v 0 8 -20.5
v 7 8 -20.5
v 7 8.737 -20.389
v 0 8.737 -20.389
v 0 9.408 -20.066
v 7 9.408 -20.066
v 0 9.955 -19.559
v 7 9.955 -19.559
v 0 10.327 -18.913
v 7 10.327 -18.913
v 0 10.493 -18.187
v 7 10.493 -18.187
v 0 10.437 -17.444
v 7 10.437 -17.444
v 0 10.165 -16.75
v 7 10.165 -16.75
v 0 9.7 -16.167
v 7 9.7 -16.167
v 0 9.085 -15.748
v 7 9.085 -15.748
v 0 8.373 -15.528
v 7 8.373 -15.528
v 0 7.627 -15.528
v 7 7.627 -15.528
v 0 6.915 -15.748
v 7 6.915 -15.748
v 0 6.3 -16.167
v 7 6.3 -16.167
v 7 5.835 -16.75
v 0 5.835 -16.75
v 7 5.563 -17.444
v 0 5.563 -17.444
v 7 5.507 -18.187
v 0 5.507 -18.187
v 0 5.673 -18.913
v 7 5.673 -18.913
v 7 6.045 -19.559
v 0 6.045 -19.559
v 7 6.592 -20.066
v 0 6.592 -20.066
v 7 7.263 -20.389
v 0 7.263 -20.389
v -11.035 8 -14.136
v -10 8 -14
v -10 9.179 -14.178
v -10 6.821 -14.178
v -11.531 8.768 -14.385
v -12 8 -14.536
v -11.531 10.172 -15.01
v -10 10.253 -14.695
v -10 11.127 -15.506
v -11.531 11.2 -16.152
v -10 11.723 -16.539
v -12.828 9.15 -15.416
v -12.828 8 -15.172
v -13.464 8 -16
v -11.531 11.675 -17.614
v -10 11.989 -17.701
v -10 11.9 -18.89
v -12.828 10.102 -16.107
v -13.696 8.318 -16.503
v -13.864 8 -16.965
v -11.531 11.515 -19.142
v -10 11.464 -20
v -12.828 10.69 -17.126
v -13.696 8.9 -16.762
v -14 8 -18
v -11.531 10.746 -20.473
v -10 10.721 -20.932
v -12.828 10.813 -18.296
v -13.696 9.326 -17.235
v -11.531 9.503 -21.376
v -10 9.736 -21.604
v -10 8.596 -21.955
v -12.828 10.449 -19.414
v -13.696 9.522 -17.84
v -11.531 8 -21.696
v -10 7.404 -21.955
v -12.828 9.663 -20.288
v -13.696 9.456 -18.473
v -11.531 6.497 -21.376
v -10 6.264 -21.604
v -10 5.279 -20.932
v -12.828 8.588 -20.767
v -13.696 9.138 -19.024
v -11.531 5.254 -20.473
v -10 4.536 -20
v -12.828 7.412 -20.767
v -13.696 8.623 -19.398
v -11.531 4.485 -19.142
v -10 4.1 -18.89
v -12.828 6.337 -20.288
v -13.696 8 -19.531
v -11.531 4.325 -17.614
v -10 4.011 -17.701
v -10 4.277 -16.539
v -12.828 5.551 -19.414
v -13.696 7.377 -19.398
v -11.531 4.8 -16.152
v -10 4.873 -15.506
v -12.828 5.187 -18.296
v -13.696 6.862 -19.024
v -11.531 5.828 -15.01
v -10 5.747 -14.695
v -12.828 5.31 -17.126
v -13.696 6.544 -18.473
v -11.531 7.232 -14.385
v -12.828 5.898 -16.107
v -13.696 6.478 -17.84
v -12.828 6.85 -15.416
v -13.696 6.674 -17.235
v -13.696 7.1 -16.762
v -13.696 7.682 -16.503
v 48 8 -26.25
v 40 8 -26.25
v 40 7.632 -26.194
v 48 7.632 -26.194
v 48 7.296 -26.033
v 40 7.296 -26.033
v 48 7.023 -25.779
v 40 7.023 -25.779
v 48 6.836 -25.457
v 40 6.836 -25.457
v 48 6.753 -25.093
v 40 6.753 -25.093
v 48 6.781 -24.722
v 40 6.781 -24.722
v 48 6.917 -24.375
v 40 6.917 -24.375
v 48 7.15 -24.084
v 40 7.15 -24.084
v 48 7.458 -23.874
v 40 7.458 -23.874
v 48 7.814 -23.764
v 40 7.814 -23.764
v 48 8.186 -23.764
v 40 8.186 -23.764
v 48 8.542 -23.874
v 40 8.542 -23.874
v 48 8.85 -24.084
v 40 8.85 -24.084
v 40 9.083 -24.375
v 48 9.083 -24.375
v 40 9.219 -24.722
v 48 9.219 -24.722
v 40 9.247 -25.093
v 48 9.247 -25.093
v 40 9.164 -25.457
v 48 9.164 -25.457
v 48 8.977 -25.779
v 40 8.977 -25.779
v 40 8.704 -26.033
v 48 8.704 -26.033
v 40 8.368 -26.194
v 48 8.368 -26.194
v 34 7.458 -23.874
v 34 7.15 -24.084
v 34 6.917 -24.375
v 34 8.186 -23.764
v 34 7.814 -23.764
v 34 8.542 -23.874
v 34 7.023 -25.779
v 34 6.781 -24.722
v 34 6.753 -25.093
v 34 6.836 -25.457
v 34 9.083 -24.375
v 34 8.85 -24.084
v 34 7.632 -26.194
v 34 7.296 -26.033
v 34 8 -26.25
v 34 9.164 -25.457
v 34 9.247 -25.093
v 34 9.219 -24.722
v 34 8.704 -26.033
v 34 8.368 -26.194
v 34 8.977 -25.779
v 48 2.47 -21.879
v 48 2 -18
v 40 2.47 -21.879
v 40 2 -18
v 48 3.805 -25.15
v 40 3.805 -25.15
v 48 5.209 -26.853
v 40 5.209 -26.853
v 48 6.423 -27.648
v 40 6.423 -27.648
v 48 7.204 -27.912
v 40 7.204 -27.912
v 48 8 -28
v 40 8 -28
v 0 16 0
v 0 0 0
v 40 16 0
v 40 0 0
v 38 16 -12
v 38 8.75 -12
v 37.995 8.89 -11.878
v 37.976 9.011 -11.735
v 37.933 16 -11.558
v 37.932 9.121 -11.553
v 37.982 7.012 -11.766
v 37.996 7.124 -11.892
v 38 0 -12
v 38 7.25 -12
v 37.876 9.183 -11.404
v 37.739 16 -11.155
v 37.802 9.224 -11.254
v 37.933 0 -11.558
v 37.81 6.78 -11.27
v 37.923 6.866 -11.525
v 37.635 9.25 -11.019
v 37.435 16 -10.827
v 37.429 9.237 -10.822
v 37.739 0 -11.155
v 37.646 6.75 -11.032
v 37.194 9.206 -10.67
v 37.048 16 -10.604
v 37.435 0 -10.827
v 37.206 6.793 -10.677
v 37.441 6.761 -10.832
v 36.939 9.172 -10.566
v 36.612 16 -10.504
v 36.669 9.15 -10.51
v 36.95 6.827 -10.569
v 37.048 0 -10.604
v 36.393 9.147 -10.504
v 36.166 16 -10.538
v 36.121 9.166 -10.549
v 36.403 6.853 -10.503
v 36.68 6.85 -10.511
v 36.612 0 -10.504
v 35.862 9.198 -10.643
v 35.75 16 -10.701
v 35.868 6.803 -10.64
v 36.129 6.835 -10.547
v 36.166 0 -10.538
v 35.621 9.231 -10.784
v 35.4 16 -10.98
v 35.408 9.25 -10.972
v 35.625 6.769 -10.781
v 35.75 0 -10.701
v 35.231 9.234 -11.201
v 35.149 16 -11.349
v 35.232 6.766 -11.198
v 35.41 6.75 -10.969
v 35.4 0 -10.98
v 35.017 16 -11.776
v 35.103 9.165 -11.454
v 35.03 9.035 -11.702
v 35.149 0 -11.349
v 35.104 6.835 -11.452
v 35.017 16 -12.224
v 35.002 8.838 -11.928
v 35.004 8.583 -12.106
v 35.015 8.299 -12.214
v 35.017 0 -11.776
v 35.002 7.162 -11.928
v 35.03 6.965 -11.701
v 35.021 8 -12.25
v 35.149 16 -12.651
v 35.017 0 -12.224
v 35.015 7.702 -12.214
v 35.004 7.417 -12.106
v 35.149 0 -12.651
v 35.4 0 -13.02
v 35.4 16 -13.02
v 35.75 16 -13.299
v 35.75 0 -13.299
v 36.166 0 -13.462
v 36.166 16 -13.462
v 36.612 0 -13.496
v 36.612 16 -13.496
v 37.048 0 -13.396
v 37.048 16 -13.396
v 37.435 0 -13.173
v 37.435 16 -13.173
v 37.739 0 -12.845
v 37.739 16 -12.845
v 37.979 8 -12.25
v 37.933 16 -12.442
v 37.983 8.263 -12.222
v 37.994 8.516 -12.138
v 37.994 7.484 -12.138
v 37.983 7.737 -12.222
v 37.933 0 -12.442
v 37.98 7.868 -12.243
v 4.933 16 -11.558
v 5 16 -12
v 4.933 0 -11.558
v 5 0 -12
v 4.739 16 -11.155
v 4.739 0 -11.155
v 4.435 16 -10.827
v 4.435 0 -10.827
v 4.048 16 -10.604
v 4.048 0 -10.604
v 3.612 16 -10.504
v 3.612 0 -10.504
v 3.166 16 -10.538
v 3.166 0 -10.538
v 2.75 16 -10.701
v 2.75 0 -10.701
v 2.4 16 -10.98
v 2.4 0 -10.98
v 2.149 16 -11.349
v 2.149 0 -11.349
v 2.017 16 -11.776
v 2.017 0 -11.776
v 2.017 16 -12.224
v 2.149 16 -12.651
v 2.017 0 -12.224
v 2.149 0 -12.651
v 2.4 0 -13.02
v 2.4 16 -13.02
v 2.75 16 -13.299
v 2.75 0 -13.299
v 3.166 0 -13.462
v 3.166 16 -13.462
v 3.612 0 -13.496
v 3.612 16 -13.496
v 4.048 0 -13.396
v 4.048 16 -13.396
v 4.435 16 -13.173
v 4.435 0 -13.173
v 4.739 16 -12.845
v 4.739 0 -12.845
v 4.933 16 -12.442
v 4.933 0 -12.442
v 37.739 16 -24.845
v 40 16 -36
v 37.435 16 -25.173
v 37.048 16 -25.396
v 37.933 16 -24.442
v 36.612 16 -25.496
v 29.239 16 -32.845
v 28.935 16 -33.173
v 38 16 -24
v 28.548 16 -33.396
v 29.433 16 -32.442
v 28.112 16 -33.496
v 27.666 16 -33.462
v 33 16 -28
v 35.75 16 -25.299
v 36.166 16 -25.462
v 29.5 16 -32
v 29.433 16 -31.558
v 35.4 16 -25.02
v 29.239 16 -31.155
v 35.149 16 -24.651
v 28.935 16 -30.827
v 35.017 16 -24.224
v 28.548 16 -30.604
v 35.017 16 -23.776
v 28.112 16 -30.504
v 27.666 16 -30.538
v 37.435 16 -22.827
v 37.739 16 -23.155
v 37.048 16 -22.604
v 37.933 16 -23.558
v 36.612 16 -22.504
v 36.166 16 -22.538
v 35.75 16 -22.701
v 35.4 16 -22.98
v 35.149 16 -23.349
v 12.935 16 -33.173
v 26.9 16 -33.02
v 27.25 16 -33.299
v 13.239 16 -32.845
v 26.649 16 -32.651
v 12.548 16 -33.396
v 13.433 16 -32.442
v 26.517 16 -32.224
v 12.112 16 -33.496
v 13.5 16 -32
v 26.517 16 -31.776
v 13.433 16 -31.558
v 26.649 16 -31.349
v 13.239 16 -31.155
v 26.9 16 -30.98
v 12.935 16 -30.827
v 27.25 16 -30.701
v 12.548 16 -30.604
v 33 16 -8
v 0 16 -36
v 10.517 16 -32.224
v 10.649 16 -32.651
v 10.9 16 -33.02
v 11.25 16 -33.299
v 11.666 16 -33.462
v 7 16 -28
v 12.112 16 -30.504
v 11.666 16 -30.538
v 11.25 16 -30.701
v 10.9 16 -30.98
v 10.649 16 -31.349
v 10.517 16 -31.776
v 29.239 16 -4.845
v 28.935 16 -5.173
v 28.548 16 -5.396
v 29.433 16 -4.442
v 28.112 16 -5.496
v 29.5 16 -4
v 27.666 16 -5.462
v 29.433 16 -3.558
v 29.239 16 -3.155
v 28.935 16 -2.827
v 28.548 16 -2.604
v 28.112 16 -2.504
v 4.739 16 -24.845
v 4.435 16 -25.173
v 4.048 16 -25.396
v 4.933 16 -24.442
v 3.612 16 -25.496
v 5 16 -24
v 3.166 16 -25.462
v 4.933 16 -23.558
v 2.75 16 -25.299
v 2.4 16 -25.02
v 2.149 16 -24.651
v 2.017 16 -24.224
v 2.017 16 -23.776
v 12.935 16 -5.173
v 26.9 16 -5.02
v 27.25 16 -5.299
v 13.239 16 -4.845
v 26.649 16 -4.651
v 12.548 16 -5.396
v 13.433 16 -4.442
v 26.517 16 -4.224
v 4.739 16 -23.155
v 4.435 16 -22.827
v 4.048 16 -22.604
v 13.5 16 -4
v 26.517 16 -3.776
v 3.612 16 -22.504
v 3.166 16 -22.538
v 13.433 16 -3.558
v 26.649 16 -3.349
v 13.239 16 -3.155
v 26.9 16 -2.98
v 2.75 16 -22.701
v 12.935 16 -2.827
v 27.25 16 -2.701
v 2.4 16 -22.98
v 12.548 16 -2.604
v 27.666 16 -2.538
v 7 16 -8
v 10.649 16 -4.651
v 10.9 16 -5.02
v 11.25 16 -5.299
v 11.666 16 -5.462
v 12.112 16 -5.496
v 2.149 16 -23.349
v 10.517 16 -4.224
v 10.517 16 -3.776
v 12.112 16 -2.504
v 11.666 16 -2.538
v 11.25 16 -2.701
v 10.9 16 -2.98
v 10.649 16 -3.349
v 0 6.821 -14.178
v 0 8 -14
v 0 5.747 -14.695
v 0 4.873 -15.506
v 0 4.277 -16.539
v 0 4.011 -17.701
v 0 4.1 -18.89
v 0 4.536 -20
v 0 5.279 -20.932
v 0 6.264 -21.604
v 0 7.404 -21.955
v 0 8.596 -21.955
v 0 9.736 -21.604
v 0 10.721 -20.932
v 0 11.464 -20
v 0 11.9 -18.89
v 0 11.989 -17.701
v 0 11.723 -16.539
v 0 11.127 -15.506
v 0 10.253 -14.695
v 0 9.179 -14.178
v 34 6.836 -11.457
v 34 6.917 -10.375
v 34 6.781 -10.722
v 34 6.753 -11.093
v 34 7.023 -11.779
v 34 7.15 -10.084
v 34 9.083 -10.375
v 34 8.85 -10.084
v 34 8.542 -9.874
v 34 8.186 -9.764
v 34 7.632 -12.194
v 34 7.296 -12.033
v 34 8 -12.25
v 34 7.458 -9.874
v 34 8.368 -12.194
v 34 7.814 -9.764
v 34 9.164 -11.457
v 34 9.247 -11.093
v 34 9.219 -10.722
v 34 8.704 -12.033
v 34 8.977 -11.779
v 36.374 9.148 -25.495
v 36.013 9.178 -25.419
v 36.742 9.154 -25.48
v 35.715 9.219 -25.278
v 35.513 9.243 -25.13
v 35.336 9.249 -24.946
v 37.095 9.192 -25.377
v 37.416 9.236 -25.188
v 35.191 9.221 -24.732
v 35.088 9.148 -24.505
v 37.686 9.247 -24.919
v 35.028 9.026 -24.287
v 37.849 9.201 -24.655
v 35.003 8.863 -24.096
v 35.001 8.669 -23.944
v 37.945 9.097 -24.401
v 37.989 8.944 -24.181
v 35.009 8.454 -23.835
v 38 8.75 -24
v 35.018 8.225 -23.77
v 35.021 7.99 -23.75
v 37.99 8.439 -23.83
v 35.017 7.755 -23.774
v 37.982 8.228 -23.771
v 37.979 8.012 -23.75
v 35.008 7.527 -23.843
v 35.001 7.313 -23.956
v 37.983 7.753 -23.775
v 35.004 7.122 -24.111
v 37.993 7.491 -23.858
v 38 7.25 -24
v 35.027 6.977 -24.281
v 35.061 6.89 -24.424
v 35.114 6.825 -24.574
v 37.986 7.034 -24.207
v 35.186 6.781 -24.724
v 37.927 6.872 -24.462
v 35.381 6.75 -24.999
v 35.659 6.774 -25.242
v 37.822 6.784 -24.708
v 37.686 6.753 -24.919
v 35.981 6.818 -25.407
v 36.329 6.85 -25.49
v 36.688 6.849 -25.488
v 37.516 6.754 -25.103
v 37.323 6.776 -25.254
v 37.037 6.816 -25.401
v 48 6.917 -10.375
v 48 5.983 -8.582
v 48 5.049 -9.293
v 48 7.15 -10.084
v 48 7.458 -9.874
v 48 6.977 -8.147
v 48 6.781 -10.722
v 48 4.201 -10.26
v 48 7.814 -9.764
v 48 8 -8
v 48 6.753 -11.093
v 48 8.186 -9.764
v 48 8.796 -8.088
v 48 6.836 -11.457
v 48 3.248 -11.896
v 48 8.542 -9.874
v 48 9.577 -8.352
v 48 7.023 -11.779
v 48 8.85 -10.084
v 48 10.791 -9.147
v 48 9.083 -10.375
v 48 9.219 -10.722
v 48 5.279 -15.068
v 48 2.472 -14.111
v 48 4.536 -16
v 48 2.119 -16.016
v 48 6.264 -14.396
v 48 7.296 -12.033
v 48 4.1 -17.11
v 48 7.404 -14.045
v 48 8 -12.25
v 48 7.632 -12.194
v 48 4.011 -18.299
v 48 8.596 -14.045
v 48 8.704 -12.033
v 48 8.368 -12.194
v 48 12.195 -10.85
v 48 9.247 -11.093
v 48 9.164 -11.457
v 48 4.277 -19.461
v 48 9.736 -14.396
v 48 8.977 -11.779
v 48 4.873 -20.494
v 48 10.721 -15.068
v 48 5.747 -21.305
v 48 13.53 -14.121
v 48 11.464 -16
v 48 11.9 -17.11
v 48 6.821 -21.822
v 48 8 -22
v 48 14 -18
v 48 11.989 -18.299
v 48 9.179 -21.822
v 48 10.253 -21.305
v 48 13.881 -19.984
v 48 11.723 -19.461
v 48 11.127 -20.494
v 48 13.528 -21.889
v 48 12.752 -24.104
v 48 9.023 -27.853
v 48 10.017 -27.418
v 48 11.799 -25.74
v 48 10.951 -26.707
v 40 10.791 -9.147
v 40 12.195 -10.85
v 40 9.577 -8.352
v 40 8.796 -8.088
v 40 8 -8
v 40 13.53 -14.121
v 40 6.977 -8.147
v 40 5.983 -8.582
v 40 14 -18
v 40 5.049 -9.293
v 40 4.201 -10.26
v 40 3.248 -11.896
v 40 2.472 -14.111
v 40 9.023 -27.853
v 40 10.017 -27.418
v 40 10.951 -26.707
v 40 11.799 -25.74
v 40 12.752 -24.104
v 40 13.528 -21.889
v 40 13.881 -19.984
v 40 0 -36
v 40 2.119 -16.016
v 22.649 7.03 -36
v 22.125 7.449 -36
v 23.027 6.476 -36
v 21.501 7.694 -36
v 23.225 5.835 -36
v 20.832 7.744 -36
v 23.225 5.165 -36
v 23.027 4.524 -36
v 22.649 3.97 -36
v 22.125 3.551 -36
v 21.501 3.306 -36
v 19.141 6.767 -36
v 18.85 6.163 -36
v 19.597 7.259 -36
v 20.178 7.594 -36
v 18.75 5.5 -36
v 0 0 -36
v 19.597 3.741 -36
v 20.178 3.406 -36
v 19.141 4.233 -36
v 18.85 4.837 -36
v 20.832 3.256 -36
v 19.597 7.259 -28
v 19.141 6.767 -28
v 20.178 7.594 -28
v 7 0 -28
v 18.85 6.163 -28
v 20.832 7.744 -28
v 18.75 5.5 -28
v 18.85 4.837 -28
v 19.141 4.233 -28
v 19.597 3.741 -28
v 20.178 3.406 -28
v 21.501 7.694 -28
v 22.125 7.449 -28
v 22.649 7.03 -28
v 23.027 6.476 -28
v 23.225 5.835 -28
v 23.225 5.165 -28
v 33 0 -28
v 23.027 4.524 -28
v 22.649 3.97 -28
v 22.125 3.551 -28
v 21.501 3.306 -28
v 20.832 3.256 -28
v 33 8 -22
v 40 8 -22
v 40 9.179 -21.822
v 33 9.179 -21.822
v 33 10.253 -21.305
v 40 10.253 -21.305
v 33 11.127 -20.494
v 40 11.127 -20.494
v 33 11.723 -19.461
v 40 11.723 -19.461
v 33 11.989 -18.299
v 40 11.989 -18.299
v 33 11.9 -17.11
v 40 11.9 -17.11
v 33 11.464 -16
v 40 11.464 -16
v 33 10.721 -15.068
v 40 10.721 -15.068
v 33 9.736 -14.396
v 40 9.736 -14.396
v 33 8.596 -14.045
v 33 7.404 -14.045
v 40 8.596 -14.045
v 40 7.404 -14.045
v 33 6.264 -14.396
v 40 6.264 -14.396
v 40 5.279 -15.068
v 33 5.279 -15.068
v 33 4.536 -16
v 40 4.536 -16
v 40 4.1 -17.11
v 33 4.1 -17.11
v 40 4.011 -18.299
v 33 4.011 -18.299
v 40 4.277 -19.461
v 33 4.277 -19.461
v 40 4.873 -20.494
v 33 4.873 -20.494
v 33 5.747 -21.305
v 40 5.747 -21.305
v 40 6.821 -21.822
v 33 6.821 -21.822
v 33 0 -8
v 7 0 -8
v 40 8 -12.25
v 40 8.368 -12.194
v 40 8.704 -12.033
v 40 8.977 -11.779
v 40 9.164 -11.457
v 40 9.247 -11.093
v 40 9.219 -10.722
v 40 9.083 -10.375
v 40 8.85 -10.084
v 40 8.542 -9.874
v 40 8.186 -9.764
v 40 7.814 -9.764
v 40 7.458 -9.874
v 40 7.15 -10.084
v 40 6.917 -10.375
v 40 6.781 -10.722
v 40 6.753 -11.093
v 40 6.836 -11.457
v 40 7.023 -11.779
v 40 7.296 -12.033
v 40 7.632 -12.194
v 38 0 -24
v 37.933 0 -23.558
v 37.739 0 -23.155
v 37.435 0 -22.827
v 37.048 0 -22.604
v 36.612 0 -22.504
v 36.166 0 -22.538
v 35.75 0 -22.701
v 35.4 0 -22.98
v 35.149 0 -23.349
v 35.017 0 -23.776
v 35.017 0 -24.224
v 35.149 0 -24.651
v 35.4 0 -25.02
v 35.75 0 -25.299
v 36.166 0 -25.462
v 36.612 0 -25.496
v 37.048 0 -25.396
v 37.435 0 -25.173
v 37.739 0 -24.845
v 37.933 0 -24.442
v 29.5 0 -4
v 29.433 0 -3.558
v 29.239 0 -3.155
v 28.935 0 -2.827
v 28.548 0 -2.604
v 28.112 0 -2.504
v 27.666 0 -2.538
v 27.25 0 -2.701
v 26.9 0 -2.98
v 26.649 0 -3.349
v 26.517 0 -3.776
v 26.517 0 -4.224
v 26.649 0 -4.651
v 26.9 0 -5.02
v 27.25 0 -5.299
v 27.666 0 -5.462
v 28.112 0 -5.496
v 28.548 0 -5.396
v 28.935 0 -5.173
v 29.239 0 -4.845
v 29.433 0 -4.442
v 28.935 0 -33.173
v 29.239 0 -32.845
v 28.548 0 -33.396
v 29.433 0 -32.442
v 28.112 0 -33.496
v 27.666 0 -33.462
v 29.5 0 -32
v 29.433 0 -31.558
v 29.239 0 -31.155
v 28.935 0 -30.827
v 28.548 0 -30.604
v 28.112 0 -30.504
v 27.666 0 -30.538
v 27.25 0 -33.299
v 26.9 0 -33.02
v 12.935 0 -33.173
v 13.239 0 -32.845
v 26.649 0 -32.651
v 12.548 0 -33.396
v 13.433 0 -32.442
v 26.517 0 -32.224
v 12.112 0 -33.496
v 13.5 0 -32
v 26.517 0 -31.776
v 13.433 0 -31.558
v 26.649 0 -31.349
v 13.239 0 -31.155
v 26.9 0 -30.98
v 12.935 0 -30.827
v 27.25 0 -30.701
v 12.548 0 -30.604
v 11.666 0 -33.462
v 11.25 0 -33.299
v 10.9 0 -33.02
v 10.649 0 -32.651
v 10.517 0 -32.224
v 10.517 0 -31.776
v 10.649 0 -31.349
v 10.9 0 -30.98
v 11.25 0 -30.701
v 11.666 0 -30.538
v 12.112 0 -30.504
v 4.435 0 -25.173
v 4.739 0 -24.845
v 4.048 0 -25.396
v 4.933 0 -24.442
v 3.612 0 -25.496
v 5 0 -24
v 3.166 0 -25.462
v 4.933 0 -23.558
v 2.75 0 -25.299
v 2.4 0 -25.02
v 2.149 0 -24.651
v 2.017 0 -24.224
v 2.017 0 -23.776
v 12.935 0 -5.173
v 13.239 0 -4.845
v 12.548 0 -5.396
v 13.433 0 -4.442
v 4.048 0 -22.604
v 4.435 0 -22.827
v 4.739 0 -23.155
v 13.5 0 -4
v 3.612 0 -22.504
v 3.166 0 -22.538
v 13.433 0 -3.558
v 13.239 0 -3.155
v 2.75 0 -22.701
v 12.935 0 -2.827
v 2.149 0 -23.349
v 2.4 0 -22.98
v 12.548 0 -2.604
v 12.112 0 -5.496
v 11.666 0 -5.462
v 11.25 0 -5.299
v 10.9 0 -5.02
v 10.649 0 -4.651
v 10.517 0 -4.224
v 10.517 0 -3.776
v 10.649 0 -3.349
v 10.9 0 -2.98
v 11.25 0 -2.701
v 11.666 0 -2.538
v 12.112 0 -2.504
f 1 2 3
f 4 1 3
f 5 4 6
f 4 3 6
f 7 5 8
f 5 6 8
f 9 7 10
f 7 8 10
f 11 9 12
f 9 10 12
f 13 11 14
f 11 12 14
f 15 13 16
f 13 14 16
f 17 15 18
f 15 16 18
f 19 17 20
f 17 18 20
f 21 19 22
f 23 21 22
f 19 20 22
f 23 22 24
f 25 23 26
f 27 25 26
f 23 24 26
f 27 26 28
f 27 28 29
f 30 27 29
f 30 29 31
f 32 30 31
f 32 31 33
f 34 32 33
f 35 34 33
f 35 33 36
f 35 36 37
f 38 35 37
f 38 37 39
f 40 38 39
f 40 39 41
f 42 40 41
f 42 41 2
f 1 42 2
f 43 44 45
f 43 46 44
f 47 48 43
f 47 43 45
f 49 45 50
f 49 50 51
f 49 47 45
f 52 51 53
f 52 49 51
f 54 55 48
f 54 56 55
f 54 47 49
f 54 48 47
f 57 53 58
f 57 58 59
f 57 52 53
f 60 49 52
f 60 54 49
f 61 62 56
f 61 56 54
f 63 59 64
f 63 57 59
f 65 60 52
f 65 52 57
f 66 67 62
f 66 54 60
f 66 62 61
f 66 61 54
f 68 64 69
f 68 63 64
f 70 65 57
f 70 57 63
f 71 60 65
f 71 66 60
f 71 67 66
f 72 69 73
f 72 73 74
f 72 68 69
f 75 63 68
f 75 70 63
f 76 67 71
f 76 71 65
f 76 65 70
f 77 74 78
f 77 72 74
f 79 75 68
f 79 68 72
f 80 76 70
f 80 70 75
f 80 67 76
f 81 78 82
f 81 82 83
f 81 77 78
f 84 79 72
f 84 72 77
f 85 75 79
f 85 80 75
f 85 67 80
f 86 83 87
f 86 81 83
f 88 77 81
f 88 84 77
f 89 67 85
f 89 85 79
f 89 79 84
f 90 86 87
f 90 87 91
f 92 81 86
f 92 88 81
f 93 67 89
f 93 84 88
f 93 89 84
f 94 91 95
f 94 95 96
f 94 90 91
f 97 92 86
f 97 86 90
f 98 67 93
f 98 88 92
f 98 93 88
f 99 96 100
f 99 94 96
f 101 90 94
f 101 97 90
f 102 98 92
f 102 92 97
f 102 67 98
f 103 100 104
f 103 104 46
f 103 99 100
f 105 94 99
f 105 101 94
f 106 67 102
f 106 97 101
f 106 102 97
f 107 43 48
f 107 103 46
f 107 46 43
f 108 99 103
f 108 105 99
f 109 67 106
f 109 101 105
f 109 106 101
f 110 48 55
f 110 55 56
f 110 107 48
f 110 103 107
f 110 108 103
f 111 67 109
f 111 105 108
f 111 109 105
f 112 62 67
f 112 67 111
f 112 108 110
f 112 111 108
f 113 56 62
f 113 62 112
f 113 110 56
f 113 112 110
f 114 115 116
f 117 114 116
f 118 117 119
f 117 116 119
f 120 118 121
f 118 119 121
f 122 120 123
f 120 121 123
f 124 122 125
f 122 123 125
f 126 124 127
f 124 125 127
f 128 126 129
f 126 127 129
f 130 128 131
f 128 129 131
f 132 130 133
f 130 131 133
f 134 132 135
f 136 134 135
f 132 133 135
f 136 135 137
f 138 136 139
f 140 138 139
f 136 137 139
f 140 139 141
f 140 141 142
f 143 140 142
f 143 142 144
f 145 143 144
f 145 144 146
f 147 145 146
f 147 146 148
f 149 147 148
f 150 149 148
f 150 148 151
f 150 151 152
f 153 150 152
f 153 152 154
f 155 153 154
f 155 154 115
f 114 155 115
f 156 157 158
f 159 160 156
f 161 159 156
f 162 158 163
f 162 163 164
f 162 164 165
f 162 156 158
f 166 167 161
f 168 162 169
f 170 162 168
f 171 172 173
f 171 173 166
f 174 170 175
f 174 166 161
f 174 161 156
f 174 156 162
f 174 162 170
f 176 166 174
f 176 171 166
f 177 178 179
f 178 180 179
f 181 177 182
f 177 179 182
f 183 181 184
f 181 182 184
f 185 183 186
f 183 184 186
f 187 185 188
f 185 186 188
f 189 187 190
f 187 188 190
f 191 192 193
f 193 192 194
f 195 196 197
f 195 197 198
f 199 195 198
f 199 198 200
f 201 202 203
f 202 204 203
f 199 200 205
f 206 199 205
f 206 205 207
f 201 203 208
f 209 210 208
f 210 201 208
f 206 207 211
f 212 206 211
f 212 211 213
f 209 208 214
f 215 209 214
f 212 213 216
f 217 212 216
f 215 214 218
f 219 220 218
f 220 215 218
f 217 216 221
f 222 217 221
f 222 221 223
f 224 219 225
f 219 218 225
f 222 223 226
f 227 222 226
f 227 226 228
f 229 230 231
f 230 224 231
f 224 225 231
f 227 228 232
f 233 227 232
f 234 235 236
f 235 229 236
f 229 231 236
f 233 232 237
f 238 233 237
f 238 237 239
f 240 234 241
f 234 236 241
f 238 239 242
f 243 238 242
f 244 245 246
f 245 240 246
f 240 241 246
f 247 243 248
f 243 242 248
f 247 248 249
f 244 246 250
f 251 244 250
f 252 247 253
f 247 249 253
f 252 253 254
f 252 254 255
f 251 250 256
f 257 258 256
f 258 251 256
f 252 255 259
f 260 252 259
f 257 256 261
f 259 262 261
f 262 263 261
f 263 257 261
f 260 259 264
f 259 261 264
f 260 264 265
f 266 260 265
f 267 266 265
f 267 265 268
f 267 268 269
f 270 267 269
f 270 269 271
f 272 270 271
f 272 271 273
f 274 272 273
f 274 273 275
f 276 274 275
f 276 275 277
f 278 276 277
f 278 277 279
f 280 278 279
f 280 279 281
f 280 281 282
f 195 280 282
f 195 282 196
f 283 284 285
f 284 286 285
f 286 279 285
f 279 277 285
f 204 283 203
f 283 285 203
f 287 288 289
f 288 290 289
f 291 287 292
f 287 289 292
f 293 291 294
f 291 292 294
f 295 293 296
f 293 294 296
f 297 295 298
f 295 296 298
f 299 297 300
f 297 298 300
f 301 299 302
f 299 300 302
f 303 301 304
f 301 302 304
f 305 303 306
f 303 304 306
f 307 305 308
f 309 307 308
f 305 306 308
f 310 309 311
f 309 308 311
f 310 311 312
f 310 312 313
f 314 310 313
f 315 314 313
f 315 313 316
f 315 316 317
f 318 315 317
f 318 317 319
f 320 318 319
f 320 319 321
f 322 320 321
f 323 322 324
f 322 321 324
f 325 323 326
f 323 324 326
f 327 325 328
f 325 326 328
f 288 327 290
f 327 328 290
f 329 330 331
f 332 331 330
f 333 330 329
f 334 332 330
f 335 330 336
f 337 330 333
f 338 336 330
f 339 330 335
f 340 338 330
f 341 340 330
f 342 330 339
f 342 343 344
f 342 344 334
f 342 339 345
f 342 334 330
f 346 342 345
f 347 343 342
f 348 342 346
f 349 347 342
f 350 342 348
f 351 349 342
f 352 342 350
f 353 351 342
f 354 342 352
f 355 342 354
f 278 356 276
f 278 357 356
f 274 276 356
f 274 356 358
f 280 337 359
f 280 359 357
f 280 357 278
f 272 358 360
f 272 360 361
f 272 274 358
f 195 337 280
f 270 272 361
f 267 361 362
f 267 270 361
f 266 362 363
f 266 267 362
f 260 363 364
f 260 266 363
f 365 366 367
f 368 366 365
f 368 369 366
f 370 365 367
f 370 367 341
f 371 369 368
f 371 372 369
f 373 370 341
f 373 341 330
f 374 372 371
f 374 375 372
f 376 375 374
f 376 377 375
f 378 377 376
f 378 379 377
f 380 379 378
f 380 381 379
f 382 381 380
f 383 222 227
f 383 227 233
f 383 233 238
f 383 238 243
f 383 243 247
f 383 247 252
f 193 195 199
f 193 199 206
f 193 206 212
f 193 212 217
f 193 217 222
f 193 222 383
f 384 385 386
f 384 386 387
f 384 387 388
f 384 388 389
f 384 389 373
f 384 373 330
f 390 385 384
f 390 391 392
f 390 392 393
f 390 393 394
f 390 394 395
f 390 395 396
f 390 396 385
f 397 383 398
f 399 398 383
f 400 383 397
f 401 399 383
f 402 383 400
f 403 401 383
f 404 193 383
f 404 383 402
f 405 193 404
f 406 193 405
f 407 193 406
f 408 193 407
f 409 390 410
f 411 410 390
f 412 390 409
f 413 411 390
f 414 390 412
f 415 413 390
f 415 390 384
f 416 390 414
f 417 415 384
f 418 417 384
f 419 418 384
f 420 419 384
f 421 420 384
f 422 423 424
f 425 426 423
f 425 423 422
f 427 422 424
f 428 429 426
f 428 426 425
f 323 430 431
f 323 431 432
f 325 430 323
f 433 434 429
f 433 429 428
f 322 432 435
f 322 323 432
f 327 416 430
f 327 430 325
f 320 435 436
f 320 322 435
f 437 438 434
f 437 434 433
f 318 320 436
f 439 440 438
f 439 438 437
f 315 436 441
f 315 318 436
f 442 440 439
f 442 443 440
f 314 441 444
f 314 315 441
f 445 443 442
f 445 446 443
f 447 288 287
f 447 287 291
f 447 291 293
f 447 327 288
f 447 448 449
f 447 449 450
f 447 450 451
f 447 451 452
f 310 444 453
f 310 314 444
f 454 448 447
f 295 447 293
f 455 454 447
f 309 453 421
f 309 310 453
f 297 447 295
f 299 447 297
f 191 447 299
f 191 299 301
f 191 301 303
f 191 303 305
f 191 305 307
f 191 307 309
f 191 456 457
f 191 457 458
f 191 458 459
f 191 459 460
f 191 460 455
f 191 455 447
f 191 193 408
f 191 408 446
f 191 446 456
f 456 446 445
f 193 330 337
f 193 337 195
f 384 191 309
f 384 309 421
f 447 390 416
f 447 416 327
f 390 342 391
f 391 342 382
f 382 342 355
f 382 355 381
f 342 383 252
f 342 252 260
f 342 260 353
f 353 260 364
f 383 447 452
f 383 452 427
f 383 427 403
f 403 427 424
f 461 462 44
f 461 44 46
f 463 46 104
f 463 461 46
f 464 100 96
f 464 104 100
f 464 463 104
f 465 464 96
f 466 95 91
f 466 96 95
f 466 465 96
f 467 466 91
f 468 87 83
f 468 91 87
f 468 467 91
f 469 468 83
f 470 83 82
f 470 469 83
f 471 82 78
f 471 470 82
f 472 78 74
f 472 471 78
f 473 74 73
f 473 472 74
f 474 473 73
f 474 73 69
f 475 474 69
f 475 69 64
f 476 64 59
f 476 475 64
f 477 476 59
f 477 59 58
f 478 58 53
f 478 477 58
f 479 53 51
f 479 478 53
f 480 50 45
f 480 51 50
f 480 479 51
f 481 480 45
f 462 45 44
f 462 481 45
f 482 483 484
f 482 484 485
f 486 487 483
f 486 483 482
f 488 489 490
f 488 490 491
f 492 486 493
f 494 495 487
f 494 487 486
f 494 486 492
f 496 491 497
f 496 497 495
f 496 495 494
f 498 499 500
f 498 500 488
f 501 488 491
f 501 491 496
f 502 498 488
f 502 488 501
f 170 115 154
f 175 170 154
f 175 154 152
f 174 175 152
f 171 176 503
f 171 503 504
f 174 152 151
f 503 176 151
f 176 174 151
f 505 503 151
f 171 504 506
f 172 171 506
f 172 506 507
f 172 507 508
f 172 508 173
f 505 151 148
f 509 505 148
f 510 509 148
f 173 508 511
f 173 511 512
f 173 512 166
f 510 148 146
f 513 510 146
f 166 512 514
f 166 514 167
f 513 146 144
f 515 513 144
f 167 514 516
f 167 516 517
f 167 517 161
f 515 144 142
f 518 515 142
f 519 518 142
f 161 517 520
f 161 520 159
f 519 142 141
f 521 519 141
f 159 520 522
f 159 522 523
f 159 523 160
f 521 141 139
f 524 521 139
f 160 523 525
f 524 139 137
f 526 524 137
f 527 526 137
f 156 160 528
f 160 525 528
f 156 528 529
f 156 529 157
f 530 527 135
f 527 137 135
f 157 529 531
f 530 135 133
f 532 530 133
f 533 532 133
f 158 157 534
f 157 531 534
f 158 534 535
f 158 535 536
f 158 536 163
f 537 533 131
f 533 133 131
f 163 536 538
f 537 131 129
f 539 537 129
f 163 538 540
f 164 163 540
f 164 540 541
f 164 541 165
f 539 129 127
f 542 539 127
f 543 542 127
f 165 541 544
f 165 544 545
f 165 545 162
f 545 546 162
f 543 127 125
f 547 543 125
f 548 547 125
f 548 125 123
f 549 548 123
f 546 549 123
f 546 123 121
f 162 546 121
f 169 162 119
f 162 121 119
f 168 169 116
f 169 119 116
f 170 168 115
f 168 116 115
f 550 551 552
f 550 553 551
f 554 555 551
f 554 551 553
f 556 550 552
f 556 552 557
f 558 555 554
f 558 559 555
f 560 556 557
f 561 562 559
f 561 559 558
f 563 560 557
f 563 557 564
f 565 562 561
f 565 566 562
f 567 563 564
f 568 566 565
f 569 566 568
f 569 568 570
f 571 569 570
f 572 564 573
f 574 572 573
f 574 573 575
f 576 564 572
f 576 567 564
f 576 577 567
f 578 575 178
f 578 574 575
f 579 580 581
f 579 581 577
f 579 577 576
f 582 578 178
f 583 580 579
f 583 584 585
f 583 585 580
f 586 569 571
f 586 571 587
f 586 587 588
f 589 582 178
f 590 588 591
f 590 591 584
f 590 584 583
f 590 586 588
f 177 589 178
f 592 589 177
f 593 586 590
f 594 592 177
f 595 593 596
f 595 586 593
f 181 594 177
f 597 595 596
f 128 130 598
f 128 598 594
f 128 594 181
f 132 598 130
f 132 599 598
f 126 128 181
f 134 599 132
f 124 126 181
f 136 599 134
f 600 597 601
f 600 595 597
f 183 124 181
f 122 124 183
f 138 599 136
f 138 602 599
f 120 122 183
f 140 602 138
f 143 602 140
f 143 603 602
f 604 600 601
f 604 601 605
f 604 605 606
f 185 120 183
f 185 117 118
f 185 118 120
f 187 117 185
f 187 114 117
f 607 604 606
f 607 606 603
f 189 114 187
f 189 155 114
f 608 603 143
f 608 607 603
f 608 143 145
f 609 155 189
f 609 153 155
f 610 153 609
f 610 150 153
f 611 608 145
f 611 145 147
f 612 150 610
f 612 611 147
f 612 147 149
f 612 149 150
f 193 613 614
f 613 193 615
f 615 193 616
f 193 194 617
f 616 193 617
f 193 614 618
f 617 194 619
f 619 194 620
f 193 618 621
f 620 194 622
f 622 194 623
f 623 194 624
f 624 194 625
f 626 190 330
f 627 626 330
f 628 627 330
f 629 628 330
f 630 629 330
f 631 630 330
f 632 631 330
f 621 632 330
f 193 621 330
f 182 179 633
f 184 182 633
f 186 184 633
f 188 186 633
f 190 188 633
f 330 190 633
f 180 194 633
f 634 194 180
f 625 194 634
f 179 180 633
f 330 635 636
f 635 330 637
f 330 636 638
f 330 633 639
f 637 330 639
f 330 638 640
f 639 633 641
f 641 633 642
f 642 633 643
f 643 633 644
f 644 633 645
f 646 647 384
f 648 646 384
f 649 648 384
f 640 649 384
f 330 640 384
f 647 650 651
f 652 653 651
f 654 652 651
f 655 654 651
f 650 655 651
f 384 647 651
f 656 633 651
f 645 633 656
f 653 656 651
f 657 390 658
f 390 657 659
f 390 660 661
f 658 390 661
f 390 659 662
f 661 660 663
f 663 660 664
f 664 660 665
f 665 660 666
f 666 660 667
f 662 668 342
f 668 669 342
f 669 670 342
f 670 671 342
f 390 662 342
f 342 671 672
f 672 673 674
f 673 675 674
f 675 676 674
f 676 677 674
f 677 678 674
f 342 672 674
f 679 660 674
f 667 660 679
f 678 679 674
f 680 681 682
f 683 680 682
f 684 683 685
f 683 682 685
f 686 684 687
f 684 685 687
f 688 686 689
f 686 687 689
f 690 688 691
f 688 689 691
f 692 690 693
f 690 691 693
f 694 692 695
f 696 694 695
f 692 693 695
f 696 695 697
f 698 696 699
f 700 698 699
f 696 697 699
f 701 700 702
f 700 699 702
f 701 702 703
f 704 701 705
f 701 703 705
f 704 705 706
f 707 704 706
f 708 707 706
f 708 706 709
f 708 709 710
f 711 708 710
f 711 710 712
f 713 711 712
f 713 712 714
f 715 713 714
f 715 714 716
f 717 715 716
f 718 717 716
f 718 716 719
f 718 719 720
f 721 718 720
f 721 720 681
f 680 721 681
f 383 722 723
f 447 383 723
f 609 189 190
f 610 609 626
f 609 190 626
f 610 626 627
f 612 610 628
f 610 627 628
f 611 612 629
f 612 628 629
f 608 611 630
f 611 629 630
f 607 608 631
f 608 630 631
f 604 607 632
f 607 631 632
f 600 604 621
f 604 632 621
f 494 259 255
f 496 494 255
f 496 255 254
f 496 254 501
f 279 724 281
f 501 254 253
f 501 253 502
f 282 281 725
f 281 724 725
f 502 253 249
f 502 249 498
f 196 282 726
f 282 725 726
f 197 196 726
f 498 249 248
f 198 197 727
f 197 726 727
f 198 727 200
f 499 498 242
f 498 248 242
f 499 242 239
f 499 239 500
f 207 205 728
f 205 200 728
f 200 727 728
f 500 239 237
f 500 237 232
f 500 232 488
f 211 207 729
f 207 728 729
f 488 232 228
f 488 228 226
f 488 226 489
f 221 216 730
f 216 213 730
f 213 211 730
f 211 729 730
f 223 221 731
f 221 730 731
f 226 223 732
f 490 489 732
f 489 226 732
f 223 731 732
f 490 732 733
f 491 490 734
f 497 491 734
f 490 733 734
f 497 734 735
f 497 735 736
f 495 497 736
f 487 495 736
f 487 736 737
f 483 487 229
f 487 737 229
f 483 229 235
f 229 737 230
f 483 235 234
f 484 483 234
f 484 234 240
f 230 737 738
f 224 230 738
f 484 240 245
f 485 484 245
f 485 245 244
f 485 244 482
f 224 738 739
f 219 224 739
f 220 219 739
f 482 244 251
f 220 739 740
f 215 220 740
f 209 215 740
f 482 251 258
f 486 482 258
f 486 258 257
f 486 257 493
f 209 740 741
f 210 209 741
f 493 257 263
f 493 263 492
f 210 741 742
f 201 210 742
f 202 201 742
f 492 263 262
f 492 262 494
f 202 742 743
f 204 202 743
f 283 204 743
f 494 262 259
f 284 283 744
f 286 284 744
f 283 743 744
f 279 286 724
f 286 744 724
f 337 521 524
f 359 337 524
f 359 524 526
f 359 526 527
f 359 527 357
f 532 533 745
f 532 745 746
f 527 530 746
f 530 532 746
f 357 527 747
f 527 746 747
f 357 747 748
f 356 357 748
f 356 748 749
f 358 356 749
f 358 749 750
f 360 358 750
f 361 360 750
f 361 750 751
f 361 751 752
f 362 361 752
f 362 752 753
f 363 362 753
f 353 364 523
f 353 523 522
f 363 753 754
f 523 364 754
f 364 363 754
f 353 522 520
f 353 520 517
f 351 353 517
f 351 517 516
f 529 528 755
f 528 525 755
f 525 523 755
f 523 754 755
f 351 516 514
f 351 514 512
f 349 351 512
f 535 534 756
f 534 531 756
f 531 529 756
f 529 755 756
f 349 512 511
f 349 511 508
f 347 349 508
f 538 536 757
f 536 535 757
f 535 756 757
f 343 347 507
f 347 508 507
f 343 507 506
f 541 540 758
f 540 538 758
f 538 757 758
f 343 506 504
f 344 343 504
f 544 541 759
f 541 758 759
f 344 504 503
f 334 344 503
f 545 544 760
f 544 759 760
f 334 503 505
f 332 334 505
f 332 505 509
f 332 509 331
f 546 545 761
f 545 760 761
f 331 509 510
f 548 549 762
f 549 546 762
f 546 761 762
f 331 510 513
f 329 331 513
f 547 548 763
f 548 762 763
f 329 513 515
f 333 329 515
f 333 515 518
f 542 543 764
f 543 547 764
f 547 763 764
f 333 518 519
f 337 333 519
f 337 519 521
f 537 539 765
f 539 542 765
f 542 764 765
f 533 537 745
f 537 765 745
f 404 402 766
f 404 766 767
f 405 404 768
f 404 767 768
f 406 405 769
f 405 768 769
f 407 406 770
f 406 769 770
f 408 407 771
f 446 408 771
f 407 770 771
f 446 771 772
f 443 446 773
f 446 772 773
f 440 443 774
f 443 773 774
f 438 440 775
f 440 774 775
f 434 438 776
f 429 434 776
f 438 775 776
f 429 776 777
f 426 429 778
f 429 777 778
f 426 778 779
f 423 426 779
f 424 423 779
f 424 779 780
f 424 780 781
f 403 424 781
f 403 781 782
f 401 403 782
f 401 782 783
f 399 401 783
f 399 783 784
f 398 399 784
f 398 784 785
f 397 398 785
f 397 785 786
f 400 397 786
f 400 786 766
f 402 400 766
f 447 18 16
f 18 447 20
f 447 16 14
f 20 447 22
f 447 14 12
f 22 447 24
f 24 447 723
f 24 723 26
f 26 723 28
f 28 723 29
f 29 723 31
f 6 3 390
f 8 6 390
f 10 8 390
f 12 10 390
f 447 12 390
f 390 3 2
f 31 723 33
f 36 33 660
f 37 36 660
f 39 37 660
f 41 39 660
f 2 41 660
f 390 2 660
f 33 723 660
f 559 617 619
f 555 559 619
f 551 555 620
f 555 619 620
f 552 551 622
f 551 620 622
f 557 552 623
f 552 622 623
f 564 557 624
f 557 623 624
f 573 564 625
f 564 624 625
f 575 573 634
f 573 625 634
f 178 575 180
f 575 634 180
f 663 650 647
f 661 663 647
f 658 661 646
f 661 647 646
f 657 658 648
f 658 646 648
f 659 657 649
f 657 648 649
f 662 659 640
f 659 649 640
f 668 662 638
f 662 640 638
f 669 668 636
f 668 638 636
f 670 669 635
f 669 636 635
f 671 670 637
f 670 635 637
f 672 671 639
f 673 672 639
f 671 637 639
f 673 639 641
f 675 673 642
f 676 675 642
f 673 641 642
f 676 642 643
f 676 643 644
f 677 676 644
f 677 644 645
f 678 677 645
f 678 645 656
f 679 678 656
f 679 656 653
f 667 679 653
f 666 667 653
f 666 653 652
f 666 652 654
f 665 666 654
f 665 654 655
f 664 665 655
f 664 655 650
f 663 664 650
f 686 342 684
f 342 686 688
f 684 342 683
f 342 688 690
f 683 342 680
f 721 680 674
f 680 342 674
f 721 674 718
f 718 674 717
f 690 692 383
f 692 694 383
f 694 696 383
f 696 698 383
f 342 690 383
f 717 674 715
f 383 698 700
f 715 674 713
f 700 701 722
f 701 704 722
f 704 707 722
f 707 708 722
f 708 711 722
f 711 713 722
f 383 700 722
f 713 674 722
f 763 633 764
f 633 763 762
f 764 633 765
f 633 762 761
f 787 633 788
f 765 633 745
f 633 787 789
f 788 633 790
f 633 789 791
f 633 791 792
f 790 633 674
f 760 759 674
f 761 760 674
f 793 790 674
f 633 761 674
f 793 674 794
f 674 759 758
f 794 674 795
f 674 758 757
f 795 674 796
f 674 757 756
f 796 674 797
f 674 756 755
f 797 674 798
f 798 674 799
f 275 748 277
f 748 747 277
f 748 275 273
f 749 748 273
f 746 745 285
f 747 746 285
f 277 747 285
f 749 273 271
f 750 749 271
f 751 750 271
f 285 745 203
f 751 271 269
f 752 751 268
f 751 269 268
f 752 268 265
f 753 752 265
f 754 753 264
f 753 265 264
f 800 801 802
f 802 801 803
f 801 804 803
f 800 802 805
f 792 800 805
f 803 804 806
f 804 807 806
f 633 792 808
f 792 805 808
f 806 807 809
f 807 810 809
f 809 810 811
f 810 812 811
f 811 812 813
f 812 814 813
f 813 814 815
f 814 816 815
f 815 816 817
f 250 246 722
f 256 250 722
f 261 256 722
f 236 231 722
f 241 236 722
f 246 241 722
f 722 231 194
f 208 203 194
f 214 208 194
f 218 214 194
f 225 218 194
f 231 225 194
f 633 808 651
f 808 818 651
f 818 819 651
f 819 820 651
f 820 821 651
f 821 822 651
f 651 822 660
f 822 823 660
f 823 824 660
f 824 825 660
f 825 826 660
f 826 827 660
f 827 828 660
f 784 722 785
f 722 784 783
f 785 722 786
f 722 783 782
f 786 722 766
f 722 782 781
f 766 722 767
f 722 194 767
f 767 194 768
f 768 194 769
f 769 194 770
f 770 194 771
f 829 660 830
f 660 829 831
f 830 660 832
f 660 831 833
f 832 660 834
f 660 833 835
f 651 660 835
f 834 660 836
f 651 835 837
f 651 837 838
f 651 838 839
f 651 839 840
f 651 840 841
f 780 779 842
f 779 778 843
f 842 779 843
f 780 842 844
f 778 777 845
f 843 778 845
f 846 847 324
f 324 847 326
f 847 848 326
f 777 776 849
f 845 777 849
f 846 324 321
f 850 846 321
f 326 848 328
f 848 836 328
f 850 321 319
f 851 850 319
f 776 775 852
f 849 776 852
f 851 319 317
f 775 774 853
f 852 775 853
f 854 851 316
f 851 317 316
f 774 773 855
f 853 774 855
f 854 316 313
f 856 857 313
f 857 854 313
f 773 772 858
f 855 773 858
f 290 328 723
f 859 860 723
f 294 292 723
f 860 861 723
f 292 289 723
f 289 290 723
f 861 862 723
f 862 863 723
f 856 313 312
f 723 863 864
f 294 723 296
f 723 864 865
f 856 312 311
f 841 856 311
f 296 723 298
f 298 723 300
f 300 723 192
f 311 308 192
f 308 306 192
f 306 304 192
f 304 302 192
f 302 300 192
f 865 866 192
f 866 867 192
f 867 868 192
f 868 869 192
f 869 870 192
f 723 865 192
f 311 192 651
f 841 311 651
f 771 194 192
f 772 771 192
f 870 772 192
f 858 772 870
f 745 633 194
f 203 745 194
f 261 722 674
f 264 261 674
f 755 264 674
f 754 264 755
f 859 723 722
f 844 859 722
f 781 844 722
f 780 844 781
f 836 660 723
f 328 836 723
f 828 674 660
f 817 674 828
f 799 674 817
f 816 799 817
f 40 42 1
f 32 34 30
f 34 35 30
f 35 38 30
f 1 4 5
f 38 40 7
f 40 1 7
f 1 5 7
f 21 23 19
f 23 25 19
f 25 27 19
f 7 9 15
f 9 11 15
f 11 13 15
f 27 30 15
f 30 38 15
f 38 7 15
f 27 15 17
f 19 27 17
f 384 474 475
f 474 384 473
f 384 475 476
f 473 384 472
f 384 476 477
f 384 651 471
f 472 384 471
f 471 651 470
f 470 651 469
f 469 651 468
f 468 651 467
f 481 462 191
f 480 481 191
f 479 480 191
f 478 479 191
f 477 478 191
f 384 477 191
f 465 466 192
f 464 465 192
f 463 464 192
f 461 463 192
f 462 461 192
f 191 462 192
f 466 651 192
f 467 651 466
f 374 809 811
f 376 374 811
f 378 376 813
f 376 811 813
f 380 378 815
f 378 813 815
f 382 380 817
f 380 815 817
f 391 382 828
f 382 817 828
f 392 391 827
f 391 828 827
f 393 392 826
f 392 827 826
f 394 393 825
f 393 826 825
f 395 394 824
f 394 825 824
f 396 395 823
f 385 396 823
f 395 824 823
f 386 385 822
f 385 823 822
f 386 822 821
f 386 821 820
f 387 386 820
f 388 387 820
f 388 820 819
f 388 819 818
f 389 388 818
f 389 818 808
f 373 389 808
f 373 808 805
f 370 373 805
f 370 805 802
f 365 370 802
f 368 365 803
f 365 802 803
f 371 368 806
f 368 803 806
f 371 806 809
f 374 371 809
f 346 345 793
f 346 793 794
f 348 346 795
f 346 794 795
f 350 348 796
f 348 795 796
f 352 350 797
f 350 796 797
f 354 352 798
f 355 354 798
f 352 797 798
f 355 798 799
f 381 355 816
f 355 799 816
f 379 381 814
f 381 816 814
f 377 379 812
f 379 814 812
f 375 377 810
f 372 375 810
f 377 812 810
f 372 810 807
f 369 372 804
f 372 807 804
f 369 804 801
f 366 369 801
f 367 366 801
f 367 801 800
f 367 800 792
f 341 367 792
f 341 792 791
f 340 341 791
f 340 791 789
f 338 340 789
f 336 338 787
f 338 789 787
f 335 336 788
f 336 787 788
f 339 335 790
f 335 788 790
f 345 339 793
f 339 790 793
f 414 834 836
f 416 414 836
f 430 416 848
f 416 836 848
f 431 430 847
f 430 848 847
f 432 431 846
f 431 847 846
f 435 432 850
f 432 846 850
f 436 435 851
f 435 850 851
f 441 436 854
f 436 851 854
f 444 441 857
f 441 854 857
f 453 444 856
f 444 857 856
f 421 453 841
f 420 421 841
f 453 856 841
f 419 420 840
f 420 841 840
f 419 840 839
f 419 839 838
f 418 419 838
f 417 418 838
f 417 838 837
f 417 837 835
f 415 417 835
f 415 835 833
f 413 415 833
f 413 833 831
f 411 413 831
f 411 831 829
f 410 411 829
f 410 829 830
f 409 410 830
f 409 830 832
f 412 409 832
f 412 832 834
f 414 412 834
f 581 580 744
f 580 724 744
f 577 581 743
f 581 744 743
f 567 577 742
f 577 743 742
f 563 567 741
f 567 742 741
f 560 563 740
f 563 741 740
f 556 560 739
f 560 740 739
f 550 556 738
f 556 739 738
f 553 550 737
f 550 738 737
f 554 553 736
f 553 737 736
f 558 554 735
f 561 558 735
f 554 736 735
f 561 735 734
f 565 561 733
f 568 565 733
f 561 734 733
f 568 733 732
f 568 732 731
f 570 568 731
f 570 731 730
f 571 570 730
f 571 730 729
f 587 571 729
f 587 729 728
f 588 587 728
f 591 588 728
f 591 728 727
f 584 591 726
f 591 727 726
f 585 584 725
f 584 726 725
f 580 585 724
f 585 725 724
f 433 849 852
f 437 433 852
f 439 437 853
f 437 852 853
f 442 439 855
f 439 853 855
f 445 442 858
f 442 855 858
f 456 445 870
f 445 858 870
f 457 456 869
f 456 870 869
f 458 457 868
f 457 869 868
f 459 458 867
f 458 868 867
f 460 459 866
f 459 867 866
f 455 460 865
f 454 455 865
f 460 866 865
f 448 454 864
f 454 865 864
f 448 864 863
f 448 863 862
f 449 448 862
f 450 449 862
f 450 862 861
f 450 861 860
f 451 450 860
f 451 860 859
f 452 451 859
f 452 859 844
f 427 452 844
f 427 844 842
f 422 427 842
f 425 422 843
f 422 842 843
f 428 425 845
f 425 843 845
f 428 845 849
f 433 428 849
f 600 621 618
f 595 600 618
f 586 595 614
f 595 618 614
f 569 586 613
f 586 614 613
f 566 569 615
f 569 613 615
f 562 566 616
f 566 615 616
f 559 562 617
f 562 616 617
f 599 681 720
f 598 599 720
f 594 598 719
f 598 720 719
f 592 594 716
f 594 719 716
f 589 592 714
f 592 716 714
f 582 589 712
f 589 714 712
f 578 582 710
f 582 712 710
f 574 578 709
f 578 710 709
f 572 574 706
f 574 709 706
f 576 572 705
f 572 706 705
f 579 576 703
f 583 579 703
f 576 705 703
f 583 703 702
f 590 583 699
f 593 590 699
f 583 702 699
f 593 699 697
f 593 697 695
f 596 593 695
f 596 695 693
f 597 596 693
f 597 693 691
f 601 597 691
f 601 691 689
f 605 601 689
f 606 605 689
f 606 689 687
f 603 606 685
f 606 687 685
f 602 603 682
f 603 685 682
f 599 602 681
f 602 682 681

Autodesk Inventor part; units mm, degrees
ref_plane "YZ Plane" through (0, 0, 0) normal (1, 0, 0) x (0, 1, 0)
ref_plane "XZ Plane" through (0, 0, 0) normal (0, 1, 0) x (-1, 0, 0)
ref_plane "XY Plane" through (0, 0, 0) normal (0, 0, 1) x (1, 0, 0)
sketch "Sketch1" plane through (0, 0, 0) normal (0, 1, 0) x (-1, 0, 0)
  line L0 (0, 0) -> (-40, 0)
  line L1 (-40, 0) -> (-40, -36)
  line L2 (-40, -36) -> (0, -36)
  line L3 (0, -36) -> (0, 0)
  line L4 (-7, -28) -> (-33, -28)
  line L5 (-33, -28) -> (-33, -8)
  line L6 (-33, -8) -> (-7, -8)
  line L7 (-7, -8) -> (-7, -28)
  dimension "d0" = 40
  dimension "d1" = 36
  dimension "d2" = 26
extrude "Extrusion1" add sketch "Sketch1" along normal blind 16
sketch "Sketch2" plane through (40, 0, 0) normal (1, 0, 0) x (0, 0, -1)
  line L0 (0, 0) -> (0, 16)
  line L1 (0, 8) -> (8, 8)
  line L2 (28, 0) -> (28, 16)
  line L3 (18, 14) -> (18, 2)
  ellipse E0 centre (18, 8) end of major axis (28, 8) minor radius 6
  line L4 (6.75, 0) -> (6.75, 16)
  line L5 (6.75, 8) -> (9.75, 8)
  circle A0 centre (11, 8) radius 1.25
  circle A1 centre (25, 8) radius 1.25
  circle A2 centre (18, 8) radius 2.5
  line L6 (12.25, 8) -> (15.5, 8)
  line L7 (20.5, 8) -> (23.75, 8)
  line L8 (20.5, 8) -> (23.75, 8)
  line L9 (26.25, 8) -> (28, 8)
  line L10 (8, 8) -> (9.75, 8)
  line L11 (12.25, 8) -> (15.5, 8)
  circle A3 centre (18, 8) radius 4
  line L12 (18, 8) -> (18, 10.5)
  line L13 (18, 12) -> (18, 14)
  dimension "d18" = 8
  dimension "d47" = 10
  dimension "d48" = 6
  dimension "d5" = 8
  dimension "d6" = 20
  dimension "d7" = 6
  dimension "d8" = 12
  dimension "d9" = 3
  dimension "d10" = 14
  dimension "d11" = 2.5
  dimension "d12" = 2.5
  dimension "d13" = 5
  dimension "d49" = 21.25
  dimension "d50" = 28
  dimension "d51" = 0
  dimension "d52" = 0
  dimension "d53" = 0
  dimension "d54" = 28
  dimension "d55" = 8
  dimension "d56" = 8
  dimension "d57" = 1.75
  dimension "d58" = 15.75
  dimension "d59" = 8
  dimension "d60" = 8
  dimension "d61" = 28
  dimension "d62" = 8
extrude "Extrusion3" cut sketch "Sketch2" against normal blind 6 contours A1 | A0
extrude "Extrusion4" cut sketch "Sketch2" against normal blind 40 contours A2 L3 | L3 A2
extrude "Extrusion5" cut sketch "Sketch2" against normal blind 8 contours A3 L7 A2 L3 | L3 A2 L6 A3 | A3 L3 A2 L7 | L6 A2 L3 A3
extrude "Extrusion6" add sketch "Sketch2" along normal blind 8 contours E0 L9 A1 L7 A3 L3 | L3 A3 L6 A0 L5 E0 | E0 L3 A3 L7 A1 L9 | L5 A0 L6 A3 L3 E0
sketch "Sketch3" plane through (0, 0, 0) normal (0, -1, 0) x (1, 0, 0)
  line L0 (0, -20.5) -> (0, -15.5)
  line L1 (0, -18) -> (7, -18)
  line L2 (7, -8) -> (7, -28)
  line L3 (3.5, -18) -> (3.5, -12)
  line L4 (3.5, -12) -> (3.5, -24)
  line L5 (7, -28) -> (7, -36)
  line L6 (40, -36) -> (0, -36)
  line L7 (7, -32) -> (12, -32)
  line L8 (7, -8) -> (7, 0)
  line L9 (7, 0) -> (7, -4)
  line L10 (12, -4) -> (7, -4)
  circle A0 centre (12, -4) radius 1.5
  circle A1 centre (12, -32) radius 1.5
  circle A2 centre (3.5, -24) radius 1.5
  circle A3 centre (3.5, -12) radius 1.5
  line L11 (20, -36) -> (20, 0) construction
  line L12 (0, 0) -> (40, 0) construction
  circle A4 centre (28, -32) radius 1.5
  circle A5 centre (36.5, -24) radius 1.5
  circle A6 centre (36.5, -12) radius 1.5
  circle A7 centre (28, -4) radius 1.5
  dimension "d25" = 6
  dimension "d26" = 12
  dimension "d27" = 5
  dimension "d28" = 3
  dimension "d29" = 3
  dimension "d30" = 3
  dimension "d31" = 3
  dimension "d32" = 90
  dimension "d33" = 32
  dimension "d34" = 4
  dimension "d35" = 18
  dimension "d36" = 36
  dimension "d37" = 13
  dimension "d38" = 16.5
  dimension "d39" = 36
  dimension "d40" = 20
  dimension "d41" = 20
  dimension "d42" = 20
  dimension "d43" = 8
  dimension "d44" = 20.5
extrude "Extrusion7" cut sketch "Sketch3" against normal blind 16
sketch "Sketch4" plane through (0, 0, -36) normal (-1, 0, 0) x (0, 0, 1)
  circle A0 centre (18, 8) radius 4
  point P0 (36, 0)
  dimension "d63" = 8
extrude "Extrusion9" add sketch "Sketch4" along normal blind 14
fillet "Fillet1" radius 4 1 edges at (-14, 8, -22)
sketch "Sketch6" plane through (40, 0, -36) normal (0, 0, -1) x (-1, 0, 0)
  line L0 (33, 5.5) -> (40, 5.5) projected
  circle A0 centre (19, 5.5) radius 2.25
  point P0 (40, 0)
  dimension "d73" = 4.5
  dimension "d74" = 21
extrude "Extrusion11" cut sketch "Sketch6" against normal blind 10
properties part number "reverse gear steam chest"
